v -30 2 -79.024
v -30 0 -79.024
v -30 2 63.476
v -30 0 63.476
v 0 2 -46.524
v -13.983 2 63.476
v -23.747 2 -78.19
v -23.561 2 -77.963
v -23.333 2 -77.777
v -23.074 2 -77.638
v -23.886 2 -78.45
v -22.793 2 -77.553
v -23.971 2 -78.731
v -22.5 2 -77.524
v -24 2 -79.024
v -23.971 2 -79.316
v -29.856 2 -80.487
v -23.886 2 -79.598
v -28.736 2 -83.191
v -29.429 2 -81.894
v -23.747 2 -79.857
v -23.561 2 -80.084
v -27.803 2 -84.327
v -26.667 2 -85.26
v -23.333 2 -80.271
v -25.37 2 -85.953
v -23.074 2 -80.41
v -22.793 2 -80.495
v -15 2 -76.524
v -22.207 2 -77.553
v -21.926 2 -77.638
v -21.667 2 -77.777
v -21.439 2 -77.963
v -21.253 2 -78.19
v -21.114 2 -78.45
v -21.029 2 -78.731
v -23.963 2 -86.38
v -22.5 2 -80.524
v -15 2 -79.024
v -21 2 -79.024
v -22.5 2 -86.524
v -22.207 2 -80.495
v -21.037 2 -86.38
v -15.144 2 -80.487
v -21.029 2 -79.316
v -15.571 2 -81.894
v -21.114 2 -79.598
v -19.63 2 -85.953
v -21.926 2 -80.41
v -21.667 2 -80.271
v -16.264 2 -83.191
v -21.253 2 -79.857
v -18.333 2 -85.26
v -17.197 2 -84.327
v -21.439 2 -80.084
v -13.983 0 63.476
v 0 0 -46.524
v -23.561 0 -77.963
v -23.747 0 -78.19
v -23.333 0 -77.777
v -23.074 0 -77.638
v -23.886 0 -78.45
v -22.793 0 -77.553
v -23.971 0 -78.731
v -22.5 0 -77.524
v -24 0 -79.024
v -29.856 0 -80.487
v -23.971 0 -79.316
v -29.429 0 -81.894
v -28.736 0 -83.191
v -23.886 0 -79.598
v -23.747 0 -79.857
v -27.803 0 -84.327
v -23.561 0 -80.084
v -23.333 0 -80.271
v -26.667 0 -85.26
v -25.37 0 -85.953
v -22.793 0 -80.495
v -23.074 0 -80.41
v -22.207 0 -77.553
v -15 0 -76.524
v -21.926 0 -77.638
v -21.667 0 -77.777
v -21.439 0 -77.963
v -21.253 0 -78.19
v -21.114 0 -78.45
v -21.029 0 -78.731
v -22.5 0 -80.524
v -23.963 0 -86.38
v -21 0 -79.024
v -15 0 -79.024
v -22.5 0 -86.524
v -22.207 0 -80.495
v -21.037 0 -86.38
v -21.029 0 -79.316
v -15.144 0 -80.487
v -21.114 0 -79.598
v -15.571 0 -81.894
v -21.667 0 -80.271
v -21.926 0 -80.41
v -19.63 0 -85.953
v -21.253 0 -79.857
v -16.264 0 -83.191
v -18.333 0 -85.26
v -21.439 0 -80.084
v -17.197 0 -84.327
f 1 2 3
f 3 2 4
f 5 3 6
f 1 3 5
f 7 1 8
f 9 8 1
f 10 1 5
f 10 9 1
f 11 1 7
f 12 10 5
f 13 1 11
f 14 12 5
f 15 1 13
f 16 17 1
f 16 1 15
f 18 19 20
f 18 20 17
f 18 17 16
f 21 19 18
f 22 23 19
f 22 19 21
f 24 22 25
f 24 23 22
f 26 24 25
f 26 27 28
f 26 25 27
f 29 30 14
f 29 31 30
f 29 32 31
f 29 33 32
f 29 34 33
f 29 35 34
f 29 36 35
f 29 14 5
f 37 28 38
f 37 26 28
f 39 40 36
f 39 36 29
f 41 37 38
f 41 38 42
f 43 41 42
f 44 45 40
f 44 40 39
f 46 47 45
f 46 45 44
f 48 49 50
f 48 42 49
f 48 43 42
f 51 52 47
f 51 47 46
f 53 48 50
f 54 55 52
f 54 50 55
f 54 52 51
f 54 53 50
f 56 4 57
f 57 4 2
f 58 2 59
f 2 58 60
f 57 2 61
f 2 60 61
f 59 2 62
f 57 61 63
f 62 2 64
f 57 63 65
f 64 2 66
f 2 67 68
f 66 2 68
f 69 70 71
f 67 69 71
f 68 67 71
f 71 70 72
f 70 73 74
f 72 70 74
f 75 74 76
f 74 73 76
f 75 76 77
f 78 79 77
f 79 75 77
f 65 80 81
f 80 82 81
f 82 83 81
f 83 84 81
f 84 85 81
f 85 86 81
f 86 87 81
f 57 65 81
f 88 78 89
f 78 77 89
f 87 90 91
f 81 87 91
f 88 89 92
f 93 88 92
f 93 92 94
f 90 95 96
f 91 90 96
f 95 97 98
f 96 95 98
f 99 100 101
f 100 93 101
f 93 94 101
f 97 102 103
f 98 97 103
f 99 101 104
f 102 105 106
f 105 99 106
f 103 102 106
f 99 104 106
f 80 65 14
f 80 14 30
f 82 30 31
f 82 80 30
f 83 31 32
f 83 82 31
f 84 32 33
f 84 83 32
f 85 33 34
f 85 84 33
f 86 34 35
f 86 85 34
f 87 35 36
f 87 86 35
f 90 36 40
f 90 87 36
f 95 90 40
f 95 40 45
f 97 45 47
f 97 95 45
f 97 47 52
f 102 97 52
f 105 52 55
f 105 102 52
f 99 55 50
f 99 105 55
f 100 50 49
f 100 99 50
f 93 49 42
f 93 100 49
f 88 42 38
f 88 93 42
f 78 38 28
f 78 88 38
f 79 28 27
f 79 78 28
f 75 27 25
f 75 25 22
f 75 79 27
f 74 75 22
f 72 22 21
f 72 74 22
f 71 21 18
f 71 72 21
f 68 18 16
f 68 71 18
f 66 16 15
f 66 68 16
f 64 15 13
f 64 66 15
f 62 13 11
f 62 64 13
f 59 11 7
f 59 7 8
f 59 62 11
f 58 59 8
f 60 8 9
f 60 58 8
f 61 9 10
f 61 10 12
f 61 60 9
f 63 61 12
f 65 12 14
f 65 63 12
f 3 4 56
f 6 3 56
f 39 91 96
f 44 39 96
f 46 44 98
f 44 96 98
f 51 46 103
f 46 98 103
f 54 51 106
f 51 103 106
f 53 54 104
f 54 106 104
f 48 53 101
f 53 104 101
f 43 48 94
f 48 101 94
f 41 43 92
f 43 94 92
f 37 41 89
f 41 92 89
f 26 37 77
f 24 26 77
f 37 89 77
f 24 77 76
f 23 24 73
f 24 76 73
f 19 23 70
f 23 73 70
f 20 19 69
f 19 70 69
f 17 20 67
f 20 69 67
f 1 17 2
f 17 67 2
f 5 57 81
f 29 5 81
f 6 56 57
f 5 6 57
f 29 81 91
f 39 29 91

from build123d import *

# Parameters (mm, degrees)
CROQUIS1_R              = 1.5
SALIENTE_EXTRUIR1_DEPTH = 2


with BuildPart() as part:
    # Croquis1 → Saliente-Extruir1 (new body)
    with BuildSketch(Plane(origin=(0, 0, 0), x_dir=(1, 0, 0), z_dir=(0, 1, 0))):
        with BuildLine():
            Line((-30, 79.023809524), (-30, 0))
            Line((-30, 0), (-30, -63.476190476))
            Line((-30, -63.476190476), (-13.983050847, -63.476190476))
            Line((-13.983050847, -63.476190476), (0, 46.523809524))
            Line((0, 46.523809524), (-15, 76.523809524))
            Line((-15, 76.523809524), (-15, 79.023809524))
            ThreePointArc((-15, 79.023809524), (-22.5, 86.523809524), (-30, 79.023809524))
        make_face()
        with Locations(Location((-22.5, 79.023809524, 0), (0, 0, 270))):
            Circle(CROQUIS1_R, mode=Mode.SUBTRACT)
    extrude(amount=SALIENTE_EXTRUIR1_DEPTH)


solid = part.part
